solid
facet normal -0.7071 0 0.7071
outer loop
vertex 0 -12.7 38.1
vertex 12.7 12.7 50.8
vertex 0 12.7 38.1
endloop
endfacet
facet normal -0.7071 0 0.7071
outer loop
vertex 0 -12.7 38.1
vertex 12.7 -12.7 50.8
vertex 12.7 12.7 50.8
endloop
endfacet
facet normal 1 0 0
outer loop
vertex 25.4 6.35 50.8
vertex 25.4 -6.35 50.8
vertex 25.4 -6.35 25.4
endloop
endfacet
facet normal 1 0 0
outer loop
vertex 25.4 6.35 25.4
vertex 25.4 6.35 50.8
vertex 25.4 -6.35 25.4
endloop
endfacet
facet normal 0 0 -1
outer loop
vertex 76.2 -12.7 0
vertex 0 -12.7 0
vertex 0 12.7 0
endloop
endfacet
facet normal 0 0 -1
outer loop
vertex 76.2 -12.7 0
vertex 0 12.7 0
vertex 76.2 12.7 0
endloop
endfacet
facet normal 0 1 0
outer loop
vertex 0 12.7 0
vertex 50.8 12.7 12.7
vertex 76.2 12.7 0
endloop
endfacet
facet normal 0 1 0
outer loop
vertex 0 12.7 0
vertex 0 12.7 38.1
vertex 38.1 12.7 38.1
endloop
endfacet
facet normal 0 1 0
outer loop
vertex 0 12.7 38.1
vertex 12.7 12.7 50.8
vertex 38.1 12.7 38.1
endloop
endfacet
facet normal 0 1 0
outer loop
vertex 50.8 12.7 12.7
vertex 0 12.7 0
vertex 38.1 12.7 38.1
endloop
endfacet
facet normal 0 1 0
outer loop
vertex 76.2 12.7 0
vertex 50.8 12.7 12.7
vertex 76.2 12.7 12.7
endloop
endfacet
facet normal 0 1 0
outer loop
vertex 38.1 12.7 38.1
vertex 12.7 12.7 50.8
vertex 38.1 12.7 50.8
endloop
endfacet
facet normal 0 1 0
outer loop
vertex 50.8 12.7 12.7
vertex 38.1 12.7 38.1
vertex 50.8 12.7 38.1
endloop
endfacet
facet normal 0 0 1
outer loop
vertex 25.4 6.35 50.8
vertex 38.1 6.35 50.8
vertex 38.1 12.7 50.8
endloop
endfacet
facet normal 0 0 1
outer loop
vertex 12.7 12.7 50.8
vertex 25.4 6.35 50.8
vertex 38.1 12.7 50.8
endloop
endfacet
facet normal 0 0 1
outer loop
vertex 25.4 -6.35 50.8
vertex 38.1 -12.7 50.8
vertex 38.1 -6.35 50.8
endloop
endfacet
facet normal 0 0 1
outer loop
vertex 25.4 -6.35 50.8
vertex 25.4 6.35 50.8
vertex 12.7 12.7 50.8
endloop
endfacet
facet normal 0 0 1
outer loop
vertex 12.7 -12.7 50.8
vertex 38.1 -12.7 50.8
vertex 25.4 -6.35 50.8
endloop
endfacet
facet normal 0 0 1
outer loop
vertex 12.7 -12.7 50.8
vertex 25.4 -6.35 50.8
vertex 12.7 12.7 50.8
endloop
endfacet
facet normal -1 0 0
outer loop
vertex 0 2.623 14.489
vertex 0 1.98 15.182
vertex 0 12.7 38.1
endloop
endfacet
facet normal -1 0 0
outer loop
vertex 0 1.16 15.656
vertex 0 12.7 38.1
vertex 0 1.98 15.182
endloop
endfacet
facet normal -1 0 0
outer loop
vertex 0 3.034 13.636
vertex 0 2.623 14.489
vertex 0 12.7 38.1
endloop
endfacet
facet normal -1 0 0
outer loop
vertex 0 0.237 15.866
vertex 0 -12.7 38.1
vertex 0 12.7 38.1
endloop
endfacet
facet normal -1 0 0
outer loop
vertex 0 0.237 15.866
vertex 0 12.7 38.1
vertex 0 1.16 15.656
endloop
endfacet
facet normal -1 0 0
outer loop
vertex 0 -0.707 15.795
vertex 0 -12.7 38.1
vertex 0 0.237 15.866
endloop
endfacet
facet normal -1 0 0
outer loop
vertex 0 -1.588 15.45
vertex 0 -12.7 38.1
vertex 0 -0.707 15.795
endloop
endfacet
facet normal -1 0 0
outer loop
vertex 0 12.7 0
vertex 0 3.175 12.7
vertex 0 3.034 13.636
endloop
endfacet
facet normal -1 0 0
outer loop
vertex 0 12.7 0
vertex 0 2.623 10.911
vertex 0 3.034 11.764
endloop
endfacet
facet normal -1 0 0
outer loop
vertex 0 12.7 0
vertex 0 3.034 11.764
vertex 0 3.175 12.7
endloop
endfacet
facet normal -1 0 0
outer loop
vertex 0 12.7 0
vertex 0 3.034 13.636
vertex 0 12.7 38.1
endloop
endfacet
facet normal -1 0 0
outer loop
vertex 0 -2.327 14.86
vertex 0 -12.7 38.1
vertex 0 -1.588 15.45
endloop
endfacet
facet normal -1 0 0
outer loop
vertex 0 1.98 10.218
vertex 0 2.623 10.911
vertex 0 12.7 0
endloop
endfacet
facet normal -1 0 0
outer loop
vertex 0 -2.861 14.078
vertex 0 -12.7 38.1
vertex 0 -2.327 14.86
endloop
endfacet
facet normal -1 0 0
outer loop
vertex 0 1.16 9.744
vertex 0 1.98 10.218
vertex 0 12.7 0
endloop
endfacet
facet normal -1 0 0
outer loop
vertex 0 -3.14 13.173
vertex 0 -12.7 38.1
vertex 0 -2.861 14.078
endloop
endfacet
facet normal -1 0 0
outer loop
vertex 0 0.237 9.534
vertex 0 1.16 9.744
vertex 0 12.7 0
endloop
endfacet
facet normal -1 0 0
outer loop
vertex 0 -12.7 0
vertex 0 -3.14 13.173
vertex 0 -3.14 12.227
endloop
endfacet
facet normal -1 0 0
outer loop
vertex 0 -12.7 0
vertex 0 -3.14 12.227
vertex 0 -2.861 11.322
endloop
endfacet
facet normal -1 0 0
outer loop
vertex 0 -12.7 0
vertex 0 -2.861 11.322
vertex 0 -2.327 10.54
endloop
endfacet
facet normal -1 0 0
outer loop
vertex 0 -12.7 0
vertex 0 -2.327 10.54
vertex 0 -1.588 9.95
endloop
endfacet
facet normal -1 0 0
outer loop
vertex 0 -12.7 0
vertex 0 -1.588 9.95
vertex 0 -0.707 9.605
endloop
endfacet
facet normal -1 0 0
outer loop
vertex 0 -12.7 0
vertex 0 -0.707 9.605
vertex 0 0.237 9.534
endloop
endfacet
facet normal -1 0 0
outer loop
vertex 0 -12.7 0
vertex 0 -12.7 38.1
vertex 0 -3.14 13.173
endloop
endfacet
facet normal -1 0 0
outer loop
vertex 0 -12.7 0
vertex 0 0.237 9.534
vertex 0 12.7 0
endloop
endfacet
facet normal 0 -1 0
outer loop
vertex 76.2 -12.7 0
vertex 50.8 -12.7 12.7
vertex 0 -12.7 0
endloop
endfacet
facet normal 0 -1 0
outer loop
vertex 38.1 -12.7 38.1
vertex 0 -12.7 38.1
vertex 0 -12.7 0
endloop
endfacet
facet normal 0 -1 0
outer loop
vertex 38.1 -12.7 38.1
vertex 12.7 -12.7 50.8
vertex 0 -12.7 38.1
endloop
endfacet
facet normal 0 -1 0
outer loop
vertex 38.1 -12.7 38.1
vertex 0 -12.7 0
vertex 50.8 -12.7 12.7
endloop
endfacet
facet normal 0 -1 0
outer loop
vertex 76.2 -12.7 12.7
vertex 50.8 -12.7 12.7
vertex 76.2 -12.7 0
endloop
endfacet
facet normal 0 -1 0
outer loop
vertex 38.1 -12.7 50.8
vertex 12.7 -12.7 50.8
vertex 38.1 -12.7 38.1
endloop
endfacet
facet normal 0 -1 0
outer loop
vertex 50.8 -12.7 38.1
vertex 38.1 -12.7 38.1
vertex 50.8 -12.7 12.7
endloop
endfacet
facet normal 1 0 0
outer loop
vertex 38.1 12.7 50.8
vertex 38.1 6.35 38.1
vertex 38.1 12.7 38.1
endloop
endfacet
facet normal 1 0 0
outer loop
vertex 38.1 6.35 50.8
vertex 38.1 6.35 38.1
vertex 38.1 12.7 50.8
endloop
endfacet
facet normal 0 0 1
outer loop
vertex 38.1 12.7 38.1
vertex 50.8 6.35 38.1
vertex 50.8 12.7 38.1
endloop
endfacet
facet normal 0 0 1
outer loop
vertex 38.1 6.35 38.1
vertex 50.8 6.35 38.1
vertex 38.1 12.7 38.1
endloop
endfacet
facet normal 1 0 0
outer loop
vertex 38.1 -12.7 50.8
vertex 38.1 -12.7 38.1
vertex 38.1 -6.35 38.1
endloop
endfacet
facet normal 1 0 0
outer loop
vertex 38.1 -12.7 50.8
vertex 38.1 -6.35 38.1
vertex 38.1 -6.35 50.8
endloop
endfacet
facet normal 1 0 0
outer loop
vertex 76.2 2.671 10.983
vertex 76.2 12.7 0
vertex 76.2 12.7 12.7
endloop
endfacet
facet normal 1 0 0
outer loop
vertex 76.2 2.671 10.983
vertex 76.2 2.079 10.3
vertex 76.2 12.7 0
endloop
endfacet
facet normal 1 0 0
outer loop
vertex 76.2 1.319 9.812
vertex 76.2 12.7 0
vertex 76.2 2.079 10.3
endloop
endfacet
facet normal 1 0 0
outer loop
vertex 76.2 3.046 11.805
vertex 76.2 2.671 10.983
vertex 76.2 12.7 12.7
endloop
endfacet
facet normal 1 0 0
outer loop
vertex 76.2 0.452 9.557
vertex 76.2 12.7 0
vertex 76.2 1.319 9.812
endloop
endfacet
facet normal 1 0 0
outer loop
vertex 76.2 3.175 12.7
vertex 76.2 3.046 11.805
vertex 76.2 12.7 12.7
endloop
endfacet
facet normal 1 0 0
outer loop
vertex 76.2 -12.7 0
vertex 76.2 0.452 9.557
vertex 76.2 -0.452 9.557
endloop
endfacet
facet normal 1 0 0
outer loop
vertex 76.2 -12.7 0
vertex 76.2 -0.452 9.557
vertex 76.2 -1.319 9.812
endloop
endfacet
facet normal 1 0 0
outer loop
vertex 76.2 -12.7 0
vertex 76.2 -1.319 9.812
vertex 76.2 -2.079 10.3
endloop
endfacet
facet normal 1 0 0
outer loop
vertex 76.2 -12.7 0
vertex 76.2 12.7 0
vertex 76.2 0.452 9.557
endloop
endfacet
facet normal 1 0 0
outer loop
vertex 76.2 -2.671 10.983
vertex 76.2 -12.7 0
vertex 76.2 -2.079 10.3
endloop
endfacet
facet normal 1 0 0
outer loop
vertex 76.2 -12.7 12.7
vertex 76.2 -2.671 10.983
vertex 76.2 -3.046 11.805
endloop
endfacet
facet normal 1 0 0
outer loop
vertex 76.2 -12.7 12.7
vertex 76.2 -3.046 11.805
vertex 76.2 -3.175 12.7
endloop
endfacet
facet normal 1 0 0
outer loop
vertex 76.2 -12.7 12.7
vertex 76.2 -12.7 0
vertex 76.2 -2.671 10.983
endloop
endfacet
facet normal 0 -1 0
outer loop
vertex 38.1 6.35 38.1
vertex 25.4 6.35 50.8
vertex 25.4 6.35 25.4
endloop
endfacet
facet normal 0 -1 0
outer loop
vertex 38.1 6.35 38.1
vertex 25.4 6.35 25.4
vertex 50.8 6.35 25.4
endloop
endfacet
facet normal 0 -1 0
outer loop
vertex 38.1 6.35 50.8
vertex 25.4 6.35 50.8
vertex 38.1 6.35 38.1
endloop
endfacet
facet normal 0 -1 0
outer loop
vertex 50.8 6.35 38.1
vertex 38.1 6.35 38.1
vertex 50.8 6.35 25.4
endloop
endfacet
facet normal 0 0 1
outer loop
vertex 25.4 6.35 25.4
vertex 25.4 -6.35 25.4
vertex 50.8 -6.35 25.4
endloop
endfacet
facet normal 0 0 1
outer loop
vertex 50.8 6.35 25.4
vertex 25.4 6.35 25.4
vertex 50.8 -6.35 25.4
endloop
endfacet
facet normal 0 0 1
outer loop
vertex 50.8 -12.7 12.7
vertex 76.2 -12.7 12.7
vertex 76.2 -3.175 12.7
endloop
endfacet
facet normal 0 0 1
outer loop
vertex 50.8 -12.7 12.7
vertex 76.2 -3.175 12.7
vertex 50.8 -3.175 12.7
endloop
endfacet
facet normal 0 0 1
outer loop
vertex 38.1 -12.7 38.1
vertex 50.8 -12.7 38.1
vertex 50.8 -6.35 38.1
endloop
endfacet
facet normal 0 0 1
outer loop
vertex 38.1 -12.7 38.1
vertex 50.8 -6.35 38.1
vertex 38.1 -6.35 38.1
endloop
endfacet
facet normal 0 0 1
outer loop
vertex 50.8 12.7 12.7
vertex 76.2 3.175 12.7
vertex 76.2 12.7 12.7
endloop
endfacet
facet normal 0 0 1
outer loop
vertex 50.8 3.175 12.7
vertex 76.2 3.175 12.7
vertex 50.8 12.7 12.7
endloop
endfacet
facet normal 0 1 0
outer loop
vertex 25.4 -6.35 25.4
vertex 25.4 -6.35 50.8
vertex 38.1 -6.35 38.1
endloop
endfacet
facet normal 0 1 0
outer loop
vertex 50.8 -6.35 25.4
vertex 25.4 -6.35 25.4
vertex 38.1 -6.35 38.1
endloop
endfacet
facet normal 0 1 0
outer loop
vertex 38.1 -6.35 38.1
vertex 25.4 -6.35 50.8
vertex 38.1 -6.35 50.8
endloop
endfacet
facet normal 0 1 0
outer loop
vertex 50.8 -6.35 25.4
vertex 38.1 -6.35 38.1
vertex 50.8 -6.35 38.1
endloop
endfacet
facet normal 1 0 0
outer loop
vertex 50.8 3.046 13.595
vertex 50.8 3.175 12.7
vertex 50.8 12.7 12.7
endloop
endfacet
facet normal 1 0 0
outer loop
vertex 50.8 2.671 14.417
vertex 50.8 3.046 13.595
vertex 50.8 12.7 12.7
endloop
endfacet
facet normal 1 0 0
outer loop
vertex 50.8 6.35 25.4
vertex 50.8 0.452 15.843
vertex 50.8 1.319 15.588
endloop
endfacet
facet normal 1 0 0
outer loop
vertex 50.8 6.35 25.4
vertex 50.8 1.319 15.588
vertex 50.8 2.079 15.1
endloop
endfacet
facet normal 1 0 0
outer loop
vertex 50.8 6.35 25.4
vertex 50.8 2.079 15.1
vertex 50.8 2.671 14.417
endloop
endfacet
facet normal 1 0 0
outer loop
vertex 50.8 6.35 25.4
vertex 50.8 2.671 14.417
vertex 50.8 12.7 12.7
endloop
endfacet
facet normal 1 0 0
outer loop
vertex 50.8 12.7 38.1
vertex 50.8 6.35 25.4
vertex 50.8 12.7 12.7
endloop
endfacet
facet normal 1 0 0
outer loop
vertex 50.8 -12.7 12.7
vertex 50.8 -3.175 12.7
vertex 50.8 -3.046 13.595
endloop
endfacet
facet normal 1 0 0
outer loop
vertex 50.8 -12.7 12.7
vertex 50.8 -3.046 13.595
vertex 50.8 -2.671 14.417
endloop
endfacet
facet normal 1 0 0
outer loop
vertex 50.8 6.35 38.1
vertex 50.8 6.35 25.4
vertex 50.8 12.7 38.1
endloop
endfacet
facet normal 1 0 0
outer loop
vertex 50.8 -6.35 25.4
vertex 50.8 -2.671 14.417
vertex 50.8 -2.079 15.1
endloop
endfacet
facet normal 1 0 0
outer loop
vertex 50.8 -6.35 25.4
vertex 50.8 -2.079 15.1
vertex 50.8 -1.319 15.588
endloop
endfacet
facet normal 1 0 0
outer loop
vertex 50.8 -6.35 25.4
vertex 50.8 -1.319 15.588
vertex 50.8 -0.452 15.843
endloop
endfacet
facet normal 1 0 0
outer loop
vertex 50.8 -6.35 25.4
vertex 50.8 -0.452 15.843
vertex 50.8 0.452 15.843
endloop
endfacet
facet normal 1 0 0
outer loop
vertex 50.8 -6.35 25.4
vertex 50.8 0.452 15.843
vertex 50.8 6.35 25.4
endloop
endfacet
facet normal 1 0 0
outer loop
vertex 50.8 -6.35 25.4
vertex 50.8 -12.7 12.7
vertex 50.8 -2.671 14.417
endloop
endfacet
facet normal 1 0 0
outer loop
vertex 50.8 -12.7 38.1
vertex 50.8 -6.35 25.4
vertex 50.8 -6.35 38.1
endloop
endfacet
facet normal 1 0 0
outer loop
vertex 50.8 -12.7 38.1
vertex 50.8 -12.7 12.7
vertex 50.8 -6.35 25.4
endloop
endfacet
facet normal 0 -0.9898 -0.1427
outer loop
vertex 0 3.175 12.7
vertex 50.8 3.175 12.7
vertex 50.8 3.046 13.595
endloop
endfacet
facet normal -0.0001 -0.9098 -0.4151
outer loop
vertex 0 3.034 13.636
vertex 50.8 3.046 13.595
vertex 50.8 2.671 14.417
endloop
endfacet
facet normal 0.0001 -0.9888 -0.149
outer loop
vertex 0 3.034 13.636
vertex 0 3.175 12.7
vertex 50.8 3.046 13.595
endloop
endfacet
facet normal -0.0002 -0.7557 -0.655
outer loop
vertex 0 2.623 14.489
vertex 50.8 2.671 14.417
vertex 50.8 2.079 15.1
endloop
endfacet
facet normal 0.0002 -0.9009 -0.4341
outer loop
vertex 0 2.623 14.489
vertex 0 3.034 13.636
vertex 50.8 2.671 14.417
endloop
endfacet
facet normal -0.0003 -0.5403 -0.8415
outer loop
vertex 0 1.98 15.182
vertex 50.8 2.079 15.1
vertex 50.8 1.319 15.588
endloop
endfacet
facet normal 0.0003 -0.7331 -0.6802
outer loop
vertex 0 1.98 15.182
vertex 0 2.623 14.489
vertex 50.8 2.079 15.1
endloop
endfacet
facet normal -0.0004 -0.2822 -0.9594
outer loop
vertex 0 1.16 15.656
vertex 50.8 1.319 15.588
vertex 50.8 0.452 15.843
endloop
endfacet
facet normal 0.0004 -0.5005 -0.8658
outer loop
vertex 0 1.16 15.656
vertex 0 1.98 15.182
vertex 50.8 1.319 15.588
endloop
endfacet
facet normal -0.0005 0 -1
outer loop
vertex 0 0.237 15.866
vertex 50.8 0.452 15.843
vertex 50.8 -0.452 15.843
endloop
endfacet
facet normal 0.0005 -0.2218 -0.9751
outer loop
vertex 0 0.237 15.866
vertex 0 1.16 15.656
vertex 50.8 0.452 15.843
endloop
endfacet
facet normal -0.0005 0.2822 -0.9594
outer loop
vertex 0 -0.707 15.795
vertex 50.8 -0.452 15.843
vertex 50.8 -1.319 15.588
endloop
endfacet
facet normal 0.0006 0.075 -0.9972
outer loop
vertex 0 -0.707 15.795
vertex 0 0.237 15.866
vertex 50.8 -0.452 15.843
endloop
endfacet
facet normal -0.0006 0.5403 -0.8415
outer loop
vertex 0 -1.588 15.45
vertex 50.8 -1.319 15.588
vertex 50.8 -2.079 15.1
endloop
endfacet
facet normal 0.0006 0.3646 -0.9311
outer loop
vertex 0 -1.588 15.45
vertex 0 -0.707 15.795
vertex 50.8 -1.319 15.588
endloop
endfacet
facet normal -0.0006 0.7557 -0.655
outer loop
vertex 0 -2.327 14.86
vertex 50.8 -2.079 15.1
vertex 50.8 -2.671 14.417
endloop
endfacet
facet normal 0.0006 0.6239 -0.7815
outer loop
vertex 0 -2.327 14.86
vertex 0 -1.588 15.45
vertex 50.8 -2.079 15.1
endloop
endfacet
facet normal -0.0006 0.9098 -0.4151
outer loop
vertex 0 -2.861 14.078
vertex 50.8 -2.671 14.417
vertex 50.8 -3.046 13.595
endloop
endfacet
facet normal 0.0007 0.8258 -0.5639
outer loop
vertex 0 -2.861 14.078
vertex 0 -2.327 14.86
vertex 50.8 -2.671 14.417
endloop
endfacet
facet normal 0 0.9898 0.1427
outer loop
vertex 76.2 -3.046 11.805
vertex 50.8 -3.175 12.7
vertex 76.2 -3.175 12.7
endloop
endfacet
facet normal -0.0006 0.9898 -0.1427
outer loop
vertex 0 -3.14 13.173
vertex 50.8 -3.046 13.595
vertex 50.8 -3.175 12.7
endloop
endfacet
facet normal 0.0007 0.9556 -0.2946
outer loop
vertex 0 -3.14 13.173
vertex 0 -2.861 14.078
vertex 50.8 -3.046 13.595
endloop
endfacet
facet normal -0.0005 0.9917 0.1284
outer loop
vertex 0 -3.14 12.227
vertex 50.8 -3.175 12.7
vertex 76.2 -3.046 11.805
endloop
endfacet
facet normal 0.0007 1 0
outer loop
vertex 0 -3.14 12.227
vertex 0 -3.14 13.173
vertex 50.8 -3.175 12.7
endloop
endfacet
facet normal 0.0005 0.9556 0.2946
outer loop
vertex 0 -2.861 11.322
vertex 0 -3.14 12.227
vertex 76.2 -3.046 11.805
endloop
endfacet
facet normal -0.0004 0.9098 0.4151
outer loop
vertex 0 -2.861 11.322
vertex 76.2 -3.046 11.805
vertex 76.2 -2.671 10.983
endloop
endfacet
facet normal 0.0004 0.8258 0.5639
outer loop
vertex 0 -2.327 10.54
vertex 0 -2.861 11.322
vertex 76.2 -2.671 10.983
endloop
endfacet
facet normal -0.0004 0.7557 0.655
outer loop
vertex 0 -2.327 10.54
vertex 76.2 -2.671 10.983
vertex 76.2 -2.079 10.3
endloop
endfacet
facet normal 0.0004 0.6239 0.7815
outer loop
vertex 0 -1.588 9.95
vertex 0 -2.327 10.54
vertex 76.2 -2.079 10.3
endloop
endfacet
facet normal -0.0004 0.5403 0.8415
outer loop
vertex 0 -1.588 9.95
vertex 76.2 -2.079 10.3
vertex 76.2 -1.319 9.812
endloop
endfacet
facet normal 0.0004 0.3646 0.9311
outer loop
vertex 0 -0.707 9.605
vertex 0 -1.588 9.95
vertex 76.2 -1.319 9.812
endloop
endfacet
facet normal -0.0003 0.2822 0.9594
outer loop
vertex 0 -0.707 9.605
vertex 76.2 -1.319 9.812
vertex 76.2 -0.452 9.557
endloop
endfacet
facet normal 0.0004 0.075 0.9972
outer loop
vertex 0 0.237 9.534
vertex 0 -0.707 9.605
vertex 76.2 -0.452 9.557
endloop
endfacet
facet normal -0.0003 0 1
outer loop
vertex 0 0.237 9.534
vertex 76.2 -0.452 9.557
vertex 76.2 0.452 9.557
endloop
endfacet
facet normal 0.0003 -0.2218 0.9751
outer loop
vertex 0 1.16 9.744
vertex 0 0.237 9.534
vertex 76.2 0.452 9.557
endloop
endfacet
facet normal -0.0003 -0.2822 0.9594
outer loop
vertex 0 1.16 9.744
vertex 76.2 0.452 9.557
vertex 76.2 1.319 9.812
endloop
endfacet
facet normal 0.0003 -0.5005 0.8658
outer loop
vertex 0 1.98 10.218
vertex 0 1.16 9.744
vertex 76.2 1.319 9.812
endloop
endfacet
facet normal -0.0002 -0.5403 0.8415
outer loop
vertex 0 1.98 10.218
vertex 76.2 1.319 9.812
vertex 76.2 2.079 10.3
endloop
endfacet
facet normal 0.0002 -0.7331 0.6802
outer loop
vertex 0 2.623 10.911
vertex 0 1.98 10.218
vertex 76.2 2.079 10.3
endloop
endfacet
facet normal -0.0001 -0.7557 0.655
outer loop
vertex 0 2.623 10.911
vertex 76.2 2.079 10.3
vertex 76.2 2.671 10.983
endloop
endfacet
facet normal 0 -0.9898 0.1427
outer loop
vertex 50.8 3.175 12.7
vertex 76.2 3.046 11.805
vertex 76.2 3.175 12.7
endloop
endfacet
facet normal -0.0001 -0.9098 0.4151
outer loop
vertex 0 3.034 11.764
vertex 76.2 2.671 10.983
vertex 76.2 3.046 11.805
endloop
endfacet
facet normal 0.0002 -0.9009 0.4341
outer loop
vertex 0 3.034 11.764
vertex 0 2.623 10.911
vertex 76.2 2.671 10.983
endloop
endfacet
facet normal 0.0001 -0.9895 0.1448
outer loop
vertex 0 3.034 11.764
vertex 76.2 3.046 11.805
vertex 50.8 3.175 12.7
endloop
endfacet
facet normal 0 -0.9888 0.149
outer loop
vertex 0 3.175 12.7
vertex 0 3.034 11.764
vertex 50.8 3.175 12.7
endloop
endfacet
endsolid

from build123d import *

# Parameters (mm, degrees)
F1_DEPTH = 12.7
F4_DEPTH = 6.35
F5_R     = 3.175
F6_DEPTH = 76.201


# Not quite as in the source:
# - a feature of the source that left no trace in its solid (it failed there, or was rolled back) is left out


with BuildPart() as f1:
    # F0 (on Front) → F1 (new body, symmetric)
    with BuildSketch(Plane.XZ):
        Polygon((0, 38.1), (0, 0), (76.2, 0), (76.2, 12.7), (50.8, 12.7), (50.8, 38.1), (38.1, 38.1), (38.1, 50.8), (12.7, 50.8), align=None)
    extrude(amount=F1_DEPTH, both=True)

    # F2 (on Front) → F4 (cut, symmetric)
    with BuildSketch(Plane.XZ):
        Polygon((38.1, 50.8), (25.4, 50.8), (25.4, 25.4), (50.8, 25.4), (50.8, 38.1), (38.1, 38.1), align=None)
    extrude(amount=F4_DEPTH, both=True, mode=Mode.SUBTRACT)

    # F5 (on Right) → F6 (cut, through all)
    with BuildSketch(Plane.YZ):
        with Locations((0, 12.7)):
            Circle(F5_R)
    extrude(amount=F6_DEPTH, mode=Mode.SUBTRACT)


solid = f1.part
